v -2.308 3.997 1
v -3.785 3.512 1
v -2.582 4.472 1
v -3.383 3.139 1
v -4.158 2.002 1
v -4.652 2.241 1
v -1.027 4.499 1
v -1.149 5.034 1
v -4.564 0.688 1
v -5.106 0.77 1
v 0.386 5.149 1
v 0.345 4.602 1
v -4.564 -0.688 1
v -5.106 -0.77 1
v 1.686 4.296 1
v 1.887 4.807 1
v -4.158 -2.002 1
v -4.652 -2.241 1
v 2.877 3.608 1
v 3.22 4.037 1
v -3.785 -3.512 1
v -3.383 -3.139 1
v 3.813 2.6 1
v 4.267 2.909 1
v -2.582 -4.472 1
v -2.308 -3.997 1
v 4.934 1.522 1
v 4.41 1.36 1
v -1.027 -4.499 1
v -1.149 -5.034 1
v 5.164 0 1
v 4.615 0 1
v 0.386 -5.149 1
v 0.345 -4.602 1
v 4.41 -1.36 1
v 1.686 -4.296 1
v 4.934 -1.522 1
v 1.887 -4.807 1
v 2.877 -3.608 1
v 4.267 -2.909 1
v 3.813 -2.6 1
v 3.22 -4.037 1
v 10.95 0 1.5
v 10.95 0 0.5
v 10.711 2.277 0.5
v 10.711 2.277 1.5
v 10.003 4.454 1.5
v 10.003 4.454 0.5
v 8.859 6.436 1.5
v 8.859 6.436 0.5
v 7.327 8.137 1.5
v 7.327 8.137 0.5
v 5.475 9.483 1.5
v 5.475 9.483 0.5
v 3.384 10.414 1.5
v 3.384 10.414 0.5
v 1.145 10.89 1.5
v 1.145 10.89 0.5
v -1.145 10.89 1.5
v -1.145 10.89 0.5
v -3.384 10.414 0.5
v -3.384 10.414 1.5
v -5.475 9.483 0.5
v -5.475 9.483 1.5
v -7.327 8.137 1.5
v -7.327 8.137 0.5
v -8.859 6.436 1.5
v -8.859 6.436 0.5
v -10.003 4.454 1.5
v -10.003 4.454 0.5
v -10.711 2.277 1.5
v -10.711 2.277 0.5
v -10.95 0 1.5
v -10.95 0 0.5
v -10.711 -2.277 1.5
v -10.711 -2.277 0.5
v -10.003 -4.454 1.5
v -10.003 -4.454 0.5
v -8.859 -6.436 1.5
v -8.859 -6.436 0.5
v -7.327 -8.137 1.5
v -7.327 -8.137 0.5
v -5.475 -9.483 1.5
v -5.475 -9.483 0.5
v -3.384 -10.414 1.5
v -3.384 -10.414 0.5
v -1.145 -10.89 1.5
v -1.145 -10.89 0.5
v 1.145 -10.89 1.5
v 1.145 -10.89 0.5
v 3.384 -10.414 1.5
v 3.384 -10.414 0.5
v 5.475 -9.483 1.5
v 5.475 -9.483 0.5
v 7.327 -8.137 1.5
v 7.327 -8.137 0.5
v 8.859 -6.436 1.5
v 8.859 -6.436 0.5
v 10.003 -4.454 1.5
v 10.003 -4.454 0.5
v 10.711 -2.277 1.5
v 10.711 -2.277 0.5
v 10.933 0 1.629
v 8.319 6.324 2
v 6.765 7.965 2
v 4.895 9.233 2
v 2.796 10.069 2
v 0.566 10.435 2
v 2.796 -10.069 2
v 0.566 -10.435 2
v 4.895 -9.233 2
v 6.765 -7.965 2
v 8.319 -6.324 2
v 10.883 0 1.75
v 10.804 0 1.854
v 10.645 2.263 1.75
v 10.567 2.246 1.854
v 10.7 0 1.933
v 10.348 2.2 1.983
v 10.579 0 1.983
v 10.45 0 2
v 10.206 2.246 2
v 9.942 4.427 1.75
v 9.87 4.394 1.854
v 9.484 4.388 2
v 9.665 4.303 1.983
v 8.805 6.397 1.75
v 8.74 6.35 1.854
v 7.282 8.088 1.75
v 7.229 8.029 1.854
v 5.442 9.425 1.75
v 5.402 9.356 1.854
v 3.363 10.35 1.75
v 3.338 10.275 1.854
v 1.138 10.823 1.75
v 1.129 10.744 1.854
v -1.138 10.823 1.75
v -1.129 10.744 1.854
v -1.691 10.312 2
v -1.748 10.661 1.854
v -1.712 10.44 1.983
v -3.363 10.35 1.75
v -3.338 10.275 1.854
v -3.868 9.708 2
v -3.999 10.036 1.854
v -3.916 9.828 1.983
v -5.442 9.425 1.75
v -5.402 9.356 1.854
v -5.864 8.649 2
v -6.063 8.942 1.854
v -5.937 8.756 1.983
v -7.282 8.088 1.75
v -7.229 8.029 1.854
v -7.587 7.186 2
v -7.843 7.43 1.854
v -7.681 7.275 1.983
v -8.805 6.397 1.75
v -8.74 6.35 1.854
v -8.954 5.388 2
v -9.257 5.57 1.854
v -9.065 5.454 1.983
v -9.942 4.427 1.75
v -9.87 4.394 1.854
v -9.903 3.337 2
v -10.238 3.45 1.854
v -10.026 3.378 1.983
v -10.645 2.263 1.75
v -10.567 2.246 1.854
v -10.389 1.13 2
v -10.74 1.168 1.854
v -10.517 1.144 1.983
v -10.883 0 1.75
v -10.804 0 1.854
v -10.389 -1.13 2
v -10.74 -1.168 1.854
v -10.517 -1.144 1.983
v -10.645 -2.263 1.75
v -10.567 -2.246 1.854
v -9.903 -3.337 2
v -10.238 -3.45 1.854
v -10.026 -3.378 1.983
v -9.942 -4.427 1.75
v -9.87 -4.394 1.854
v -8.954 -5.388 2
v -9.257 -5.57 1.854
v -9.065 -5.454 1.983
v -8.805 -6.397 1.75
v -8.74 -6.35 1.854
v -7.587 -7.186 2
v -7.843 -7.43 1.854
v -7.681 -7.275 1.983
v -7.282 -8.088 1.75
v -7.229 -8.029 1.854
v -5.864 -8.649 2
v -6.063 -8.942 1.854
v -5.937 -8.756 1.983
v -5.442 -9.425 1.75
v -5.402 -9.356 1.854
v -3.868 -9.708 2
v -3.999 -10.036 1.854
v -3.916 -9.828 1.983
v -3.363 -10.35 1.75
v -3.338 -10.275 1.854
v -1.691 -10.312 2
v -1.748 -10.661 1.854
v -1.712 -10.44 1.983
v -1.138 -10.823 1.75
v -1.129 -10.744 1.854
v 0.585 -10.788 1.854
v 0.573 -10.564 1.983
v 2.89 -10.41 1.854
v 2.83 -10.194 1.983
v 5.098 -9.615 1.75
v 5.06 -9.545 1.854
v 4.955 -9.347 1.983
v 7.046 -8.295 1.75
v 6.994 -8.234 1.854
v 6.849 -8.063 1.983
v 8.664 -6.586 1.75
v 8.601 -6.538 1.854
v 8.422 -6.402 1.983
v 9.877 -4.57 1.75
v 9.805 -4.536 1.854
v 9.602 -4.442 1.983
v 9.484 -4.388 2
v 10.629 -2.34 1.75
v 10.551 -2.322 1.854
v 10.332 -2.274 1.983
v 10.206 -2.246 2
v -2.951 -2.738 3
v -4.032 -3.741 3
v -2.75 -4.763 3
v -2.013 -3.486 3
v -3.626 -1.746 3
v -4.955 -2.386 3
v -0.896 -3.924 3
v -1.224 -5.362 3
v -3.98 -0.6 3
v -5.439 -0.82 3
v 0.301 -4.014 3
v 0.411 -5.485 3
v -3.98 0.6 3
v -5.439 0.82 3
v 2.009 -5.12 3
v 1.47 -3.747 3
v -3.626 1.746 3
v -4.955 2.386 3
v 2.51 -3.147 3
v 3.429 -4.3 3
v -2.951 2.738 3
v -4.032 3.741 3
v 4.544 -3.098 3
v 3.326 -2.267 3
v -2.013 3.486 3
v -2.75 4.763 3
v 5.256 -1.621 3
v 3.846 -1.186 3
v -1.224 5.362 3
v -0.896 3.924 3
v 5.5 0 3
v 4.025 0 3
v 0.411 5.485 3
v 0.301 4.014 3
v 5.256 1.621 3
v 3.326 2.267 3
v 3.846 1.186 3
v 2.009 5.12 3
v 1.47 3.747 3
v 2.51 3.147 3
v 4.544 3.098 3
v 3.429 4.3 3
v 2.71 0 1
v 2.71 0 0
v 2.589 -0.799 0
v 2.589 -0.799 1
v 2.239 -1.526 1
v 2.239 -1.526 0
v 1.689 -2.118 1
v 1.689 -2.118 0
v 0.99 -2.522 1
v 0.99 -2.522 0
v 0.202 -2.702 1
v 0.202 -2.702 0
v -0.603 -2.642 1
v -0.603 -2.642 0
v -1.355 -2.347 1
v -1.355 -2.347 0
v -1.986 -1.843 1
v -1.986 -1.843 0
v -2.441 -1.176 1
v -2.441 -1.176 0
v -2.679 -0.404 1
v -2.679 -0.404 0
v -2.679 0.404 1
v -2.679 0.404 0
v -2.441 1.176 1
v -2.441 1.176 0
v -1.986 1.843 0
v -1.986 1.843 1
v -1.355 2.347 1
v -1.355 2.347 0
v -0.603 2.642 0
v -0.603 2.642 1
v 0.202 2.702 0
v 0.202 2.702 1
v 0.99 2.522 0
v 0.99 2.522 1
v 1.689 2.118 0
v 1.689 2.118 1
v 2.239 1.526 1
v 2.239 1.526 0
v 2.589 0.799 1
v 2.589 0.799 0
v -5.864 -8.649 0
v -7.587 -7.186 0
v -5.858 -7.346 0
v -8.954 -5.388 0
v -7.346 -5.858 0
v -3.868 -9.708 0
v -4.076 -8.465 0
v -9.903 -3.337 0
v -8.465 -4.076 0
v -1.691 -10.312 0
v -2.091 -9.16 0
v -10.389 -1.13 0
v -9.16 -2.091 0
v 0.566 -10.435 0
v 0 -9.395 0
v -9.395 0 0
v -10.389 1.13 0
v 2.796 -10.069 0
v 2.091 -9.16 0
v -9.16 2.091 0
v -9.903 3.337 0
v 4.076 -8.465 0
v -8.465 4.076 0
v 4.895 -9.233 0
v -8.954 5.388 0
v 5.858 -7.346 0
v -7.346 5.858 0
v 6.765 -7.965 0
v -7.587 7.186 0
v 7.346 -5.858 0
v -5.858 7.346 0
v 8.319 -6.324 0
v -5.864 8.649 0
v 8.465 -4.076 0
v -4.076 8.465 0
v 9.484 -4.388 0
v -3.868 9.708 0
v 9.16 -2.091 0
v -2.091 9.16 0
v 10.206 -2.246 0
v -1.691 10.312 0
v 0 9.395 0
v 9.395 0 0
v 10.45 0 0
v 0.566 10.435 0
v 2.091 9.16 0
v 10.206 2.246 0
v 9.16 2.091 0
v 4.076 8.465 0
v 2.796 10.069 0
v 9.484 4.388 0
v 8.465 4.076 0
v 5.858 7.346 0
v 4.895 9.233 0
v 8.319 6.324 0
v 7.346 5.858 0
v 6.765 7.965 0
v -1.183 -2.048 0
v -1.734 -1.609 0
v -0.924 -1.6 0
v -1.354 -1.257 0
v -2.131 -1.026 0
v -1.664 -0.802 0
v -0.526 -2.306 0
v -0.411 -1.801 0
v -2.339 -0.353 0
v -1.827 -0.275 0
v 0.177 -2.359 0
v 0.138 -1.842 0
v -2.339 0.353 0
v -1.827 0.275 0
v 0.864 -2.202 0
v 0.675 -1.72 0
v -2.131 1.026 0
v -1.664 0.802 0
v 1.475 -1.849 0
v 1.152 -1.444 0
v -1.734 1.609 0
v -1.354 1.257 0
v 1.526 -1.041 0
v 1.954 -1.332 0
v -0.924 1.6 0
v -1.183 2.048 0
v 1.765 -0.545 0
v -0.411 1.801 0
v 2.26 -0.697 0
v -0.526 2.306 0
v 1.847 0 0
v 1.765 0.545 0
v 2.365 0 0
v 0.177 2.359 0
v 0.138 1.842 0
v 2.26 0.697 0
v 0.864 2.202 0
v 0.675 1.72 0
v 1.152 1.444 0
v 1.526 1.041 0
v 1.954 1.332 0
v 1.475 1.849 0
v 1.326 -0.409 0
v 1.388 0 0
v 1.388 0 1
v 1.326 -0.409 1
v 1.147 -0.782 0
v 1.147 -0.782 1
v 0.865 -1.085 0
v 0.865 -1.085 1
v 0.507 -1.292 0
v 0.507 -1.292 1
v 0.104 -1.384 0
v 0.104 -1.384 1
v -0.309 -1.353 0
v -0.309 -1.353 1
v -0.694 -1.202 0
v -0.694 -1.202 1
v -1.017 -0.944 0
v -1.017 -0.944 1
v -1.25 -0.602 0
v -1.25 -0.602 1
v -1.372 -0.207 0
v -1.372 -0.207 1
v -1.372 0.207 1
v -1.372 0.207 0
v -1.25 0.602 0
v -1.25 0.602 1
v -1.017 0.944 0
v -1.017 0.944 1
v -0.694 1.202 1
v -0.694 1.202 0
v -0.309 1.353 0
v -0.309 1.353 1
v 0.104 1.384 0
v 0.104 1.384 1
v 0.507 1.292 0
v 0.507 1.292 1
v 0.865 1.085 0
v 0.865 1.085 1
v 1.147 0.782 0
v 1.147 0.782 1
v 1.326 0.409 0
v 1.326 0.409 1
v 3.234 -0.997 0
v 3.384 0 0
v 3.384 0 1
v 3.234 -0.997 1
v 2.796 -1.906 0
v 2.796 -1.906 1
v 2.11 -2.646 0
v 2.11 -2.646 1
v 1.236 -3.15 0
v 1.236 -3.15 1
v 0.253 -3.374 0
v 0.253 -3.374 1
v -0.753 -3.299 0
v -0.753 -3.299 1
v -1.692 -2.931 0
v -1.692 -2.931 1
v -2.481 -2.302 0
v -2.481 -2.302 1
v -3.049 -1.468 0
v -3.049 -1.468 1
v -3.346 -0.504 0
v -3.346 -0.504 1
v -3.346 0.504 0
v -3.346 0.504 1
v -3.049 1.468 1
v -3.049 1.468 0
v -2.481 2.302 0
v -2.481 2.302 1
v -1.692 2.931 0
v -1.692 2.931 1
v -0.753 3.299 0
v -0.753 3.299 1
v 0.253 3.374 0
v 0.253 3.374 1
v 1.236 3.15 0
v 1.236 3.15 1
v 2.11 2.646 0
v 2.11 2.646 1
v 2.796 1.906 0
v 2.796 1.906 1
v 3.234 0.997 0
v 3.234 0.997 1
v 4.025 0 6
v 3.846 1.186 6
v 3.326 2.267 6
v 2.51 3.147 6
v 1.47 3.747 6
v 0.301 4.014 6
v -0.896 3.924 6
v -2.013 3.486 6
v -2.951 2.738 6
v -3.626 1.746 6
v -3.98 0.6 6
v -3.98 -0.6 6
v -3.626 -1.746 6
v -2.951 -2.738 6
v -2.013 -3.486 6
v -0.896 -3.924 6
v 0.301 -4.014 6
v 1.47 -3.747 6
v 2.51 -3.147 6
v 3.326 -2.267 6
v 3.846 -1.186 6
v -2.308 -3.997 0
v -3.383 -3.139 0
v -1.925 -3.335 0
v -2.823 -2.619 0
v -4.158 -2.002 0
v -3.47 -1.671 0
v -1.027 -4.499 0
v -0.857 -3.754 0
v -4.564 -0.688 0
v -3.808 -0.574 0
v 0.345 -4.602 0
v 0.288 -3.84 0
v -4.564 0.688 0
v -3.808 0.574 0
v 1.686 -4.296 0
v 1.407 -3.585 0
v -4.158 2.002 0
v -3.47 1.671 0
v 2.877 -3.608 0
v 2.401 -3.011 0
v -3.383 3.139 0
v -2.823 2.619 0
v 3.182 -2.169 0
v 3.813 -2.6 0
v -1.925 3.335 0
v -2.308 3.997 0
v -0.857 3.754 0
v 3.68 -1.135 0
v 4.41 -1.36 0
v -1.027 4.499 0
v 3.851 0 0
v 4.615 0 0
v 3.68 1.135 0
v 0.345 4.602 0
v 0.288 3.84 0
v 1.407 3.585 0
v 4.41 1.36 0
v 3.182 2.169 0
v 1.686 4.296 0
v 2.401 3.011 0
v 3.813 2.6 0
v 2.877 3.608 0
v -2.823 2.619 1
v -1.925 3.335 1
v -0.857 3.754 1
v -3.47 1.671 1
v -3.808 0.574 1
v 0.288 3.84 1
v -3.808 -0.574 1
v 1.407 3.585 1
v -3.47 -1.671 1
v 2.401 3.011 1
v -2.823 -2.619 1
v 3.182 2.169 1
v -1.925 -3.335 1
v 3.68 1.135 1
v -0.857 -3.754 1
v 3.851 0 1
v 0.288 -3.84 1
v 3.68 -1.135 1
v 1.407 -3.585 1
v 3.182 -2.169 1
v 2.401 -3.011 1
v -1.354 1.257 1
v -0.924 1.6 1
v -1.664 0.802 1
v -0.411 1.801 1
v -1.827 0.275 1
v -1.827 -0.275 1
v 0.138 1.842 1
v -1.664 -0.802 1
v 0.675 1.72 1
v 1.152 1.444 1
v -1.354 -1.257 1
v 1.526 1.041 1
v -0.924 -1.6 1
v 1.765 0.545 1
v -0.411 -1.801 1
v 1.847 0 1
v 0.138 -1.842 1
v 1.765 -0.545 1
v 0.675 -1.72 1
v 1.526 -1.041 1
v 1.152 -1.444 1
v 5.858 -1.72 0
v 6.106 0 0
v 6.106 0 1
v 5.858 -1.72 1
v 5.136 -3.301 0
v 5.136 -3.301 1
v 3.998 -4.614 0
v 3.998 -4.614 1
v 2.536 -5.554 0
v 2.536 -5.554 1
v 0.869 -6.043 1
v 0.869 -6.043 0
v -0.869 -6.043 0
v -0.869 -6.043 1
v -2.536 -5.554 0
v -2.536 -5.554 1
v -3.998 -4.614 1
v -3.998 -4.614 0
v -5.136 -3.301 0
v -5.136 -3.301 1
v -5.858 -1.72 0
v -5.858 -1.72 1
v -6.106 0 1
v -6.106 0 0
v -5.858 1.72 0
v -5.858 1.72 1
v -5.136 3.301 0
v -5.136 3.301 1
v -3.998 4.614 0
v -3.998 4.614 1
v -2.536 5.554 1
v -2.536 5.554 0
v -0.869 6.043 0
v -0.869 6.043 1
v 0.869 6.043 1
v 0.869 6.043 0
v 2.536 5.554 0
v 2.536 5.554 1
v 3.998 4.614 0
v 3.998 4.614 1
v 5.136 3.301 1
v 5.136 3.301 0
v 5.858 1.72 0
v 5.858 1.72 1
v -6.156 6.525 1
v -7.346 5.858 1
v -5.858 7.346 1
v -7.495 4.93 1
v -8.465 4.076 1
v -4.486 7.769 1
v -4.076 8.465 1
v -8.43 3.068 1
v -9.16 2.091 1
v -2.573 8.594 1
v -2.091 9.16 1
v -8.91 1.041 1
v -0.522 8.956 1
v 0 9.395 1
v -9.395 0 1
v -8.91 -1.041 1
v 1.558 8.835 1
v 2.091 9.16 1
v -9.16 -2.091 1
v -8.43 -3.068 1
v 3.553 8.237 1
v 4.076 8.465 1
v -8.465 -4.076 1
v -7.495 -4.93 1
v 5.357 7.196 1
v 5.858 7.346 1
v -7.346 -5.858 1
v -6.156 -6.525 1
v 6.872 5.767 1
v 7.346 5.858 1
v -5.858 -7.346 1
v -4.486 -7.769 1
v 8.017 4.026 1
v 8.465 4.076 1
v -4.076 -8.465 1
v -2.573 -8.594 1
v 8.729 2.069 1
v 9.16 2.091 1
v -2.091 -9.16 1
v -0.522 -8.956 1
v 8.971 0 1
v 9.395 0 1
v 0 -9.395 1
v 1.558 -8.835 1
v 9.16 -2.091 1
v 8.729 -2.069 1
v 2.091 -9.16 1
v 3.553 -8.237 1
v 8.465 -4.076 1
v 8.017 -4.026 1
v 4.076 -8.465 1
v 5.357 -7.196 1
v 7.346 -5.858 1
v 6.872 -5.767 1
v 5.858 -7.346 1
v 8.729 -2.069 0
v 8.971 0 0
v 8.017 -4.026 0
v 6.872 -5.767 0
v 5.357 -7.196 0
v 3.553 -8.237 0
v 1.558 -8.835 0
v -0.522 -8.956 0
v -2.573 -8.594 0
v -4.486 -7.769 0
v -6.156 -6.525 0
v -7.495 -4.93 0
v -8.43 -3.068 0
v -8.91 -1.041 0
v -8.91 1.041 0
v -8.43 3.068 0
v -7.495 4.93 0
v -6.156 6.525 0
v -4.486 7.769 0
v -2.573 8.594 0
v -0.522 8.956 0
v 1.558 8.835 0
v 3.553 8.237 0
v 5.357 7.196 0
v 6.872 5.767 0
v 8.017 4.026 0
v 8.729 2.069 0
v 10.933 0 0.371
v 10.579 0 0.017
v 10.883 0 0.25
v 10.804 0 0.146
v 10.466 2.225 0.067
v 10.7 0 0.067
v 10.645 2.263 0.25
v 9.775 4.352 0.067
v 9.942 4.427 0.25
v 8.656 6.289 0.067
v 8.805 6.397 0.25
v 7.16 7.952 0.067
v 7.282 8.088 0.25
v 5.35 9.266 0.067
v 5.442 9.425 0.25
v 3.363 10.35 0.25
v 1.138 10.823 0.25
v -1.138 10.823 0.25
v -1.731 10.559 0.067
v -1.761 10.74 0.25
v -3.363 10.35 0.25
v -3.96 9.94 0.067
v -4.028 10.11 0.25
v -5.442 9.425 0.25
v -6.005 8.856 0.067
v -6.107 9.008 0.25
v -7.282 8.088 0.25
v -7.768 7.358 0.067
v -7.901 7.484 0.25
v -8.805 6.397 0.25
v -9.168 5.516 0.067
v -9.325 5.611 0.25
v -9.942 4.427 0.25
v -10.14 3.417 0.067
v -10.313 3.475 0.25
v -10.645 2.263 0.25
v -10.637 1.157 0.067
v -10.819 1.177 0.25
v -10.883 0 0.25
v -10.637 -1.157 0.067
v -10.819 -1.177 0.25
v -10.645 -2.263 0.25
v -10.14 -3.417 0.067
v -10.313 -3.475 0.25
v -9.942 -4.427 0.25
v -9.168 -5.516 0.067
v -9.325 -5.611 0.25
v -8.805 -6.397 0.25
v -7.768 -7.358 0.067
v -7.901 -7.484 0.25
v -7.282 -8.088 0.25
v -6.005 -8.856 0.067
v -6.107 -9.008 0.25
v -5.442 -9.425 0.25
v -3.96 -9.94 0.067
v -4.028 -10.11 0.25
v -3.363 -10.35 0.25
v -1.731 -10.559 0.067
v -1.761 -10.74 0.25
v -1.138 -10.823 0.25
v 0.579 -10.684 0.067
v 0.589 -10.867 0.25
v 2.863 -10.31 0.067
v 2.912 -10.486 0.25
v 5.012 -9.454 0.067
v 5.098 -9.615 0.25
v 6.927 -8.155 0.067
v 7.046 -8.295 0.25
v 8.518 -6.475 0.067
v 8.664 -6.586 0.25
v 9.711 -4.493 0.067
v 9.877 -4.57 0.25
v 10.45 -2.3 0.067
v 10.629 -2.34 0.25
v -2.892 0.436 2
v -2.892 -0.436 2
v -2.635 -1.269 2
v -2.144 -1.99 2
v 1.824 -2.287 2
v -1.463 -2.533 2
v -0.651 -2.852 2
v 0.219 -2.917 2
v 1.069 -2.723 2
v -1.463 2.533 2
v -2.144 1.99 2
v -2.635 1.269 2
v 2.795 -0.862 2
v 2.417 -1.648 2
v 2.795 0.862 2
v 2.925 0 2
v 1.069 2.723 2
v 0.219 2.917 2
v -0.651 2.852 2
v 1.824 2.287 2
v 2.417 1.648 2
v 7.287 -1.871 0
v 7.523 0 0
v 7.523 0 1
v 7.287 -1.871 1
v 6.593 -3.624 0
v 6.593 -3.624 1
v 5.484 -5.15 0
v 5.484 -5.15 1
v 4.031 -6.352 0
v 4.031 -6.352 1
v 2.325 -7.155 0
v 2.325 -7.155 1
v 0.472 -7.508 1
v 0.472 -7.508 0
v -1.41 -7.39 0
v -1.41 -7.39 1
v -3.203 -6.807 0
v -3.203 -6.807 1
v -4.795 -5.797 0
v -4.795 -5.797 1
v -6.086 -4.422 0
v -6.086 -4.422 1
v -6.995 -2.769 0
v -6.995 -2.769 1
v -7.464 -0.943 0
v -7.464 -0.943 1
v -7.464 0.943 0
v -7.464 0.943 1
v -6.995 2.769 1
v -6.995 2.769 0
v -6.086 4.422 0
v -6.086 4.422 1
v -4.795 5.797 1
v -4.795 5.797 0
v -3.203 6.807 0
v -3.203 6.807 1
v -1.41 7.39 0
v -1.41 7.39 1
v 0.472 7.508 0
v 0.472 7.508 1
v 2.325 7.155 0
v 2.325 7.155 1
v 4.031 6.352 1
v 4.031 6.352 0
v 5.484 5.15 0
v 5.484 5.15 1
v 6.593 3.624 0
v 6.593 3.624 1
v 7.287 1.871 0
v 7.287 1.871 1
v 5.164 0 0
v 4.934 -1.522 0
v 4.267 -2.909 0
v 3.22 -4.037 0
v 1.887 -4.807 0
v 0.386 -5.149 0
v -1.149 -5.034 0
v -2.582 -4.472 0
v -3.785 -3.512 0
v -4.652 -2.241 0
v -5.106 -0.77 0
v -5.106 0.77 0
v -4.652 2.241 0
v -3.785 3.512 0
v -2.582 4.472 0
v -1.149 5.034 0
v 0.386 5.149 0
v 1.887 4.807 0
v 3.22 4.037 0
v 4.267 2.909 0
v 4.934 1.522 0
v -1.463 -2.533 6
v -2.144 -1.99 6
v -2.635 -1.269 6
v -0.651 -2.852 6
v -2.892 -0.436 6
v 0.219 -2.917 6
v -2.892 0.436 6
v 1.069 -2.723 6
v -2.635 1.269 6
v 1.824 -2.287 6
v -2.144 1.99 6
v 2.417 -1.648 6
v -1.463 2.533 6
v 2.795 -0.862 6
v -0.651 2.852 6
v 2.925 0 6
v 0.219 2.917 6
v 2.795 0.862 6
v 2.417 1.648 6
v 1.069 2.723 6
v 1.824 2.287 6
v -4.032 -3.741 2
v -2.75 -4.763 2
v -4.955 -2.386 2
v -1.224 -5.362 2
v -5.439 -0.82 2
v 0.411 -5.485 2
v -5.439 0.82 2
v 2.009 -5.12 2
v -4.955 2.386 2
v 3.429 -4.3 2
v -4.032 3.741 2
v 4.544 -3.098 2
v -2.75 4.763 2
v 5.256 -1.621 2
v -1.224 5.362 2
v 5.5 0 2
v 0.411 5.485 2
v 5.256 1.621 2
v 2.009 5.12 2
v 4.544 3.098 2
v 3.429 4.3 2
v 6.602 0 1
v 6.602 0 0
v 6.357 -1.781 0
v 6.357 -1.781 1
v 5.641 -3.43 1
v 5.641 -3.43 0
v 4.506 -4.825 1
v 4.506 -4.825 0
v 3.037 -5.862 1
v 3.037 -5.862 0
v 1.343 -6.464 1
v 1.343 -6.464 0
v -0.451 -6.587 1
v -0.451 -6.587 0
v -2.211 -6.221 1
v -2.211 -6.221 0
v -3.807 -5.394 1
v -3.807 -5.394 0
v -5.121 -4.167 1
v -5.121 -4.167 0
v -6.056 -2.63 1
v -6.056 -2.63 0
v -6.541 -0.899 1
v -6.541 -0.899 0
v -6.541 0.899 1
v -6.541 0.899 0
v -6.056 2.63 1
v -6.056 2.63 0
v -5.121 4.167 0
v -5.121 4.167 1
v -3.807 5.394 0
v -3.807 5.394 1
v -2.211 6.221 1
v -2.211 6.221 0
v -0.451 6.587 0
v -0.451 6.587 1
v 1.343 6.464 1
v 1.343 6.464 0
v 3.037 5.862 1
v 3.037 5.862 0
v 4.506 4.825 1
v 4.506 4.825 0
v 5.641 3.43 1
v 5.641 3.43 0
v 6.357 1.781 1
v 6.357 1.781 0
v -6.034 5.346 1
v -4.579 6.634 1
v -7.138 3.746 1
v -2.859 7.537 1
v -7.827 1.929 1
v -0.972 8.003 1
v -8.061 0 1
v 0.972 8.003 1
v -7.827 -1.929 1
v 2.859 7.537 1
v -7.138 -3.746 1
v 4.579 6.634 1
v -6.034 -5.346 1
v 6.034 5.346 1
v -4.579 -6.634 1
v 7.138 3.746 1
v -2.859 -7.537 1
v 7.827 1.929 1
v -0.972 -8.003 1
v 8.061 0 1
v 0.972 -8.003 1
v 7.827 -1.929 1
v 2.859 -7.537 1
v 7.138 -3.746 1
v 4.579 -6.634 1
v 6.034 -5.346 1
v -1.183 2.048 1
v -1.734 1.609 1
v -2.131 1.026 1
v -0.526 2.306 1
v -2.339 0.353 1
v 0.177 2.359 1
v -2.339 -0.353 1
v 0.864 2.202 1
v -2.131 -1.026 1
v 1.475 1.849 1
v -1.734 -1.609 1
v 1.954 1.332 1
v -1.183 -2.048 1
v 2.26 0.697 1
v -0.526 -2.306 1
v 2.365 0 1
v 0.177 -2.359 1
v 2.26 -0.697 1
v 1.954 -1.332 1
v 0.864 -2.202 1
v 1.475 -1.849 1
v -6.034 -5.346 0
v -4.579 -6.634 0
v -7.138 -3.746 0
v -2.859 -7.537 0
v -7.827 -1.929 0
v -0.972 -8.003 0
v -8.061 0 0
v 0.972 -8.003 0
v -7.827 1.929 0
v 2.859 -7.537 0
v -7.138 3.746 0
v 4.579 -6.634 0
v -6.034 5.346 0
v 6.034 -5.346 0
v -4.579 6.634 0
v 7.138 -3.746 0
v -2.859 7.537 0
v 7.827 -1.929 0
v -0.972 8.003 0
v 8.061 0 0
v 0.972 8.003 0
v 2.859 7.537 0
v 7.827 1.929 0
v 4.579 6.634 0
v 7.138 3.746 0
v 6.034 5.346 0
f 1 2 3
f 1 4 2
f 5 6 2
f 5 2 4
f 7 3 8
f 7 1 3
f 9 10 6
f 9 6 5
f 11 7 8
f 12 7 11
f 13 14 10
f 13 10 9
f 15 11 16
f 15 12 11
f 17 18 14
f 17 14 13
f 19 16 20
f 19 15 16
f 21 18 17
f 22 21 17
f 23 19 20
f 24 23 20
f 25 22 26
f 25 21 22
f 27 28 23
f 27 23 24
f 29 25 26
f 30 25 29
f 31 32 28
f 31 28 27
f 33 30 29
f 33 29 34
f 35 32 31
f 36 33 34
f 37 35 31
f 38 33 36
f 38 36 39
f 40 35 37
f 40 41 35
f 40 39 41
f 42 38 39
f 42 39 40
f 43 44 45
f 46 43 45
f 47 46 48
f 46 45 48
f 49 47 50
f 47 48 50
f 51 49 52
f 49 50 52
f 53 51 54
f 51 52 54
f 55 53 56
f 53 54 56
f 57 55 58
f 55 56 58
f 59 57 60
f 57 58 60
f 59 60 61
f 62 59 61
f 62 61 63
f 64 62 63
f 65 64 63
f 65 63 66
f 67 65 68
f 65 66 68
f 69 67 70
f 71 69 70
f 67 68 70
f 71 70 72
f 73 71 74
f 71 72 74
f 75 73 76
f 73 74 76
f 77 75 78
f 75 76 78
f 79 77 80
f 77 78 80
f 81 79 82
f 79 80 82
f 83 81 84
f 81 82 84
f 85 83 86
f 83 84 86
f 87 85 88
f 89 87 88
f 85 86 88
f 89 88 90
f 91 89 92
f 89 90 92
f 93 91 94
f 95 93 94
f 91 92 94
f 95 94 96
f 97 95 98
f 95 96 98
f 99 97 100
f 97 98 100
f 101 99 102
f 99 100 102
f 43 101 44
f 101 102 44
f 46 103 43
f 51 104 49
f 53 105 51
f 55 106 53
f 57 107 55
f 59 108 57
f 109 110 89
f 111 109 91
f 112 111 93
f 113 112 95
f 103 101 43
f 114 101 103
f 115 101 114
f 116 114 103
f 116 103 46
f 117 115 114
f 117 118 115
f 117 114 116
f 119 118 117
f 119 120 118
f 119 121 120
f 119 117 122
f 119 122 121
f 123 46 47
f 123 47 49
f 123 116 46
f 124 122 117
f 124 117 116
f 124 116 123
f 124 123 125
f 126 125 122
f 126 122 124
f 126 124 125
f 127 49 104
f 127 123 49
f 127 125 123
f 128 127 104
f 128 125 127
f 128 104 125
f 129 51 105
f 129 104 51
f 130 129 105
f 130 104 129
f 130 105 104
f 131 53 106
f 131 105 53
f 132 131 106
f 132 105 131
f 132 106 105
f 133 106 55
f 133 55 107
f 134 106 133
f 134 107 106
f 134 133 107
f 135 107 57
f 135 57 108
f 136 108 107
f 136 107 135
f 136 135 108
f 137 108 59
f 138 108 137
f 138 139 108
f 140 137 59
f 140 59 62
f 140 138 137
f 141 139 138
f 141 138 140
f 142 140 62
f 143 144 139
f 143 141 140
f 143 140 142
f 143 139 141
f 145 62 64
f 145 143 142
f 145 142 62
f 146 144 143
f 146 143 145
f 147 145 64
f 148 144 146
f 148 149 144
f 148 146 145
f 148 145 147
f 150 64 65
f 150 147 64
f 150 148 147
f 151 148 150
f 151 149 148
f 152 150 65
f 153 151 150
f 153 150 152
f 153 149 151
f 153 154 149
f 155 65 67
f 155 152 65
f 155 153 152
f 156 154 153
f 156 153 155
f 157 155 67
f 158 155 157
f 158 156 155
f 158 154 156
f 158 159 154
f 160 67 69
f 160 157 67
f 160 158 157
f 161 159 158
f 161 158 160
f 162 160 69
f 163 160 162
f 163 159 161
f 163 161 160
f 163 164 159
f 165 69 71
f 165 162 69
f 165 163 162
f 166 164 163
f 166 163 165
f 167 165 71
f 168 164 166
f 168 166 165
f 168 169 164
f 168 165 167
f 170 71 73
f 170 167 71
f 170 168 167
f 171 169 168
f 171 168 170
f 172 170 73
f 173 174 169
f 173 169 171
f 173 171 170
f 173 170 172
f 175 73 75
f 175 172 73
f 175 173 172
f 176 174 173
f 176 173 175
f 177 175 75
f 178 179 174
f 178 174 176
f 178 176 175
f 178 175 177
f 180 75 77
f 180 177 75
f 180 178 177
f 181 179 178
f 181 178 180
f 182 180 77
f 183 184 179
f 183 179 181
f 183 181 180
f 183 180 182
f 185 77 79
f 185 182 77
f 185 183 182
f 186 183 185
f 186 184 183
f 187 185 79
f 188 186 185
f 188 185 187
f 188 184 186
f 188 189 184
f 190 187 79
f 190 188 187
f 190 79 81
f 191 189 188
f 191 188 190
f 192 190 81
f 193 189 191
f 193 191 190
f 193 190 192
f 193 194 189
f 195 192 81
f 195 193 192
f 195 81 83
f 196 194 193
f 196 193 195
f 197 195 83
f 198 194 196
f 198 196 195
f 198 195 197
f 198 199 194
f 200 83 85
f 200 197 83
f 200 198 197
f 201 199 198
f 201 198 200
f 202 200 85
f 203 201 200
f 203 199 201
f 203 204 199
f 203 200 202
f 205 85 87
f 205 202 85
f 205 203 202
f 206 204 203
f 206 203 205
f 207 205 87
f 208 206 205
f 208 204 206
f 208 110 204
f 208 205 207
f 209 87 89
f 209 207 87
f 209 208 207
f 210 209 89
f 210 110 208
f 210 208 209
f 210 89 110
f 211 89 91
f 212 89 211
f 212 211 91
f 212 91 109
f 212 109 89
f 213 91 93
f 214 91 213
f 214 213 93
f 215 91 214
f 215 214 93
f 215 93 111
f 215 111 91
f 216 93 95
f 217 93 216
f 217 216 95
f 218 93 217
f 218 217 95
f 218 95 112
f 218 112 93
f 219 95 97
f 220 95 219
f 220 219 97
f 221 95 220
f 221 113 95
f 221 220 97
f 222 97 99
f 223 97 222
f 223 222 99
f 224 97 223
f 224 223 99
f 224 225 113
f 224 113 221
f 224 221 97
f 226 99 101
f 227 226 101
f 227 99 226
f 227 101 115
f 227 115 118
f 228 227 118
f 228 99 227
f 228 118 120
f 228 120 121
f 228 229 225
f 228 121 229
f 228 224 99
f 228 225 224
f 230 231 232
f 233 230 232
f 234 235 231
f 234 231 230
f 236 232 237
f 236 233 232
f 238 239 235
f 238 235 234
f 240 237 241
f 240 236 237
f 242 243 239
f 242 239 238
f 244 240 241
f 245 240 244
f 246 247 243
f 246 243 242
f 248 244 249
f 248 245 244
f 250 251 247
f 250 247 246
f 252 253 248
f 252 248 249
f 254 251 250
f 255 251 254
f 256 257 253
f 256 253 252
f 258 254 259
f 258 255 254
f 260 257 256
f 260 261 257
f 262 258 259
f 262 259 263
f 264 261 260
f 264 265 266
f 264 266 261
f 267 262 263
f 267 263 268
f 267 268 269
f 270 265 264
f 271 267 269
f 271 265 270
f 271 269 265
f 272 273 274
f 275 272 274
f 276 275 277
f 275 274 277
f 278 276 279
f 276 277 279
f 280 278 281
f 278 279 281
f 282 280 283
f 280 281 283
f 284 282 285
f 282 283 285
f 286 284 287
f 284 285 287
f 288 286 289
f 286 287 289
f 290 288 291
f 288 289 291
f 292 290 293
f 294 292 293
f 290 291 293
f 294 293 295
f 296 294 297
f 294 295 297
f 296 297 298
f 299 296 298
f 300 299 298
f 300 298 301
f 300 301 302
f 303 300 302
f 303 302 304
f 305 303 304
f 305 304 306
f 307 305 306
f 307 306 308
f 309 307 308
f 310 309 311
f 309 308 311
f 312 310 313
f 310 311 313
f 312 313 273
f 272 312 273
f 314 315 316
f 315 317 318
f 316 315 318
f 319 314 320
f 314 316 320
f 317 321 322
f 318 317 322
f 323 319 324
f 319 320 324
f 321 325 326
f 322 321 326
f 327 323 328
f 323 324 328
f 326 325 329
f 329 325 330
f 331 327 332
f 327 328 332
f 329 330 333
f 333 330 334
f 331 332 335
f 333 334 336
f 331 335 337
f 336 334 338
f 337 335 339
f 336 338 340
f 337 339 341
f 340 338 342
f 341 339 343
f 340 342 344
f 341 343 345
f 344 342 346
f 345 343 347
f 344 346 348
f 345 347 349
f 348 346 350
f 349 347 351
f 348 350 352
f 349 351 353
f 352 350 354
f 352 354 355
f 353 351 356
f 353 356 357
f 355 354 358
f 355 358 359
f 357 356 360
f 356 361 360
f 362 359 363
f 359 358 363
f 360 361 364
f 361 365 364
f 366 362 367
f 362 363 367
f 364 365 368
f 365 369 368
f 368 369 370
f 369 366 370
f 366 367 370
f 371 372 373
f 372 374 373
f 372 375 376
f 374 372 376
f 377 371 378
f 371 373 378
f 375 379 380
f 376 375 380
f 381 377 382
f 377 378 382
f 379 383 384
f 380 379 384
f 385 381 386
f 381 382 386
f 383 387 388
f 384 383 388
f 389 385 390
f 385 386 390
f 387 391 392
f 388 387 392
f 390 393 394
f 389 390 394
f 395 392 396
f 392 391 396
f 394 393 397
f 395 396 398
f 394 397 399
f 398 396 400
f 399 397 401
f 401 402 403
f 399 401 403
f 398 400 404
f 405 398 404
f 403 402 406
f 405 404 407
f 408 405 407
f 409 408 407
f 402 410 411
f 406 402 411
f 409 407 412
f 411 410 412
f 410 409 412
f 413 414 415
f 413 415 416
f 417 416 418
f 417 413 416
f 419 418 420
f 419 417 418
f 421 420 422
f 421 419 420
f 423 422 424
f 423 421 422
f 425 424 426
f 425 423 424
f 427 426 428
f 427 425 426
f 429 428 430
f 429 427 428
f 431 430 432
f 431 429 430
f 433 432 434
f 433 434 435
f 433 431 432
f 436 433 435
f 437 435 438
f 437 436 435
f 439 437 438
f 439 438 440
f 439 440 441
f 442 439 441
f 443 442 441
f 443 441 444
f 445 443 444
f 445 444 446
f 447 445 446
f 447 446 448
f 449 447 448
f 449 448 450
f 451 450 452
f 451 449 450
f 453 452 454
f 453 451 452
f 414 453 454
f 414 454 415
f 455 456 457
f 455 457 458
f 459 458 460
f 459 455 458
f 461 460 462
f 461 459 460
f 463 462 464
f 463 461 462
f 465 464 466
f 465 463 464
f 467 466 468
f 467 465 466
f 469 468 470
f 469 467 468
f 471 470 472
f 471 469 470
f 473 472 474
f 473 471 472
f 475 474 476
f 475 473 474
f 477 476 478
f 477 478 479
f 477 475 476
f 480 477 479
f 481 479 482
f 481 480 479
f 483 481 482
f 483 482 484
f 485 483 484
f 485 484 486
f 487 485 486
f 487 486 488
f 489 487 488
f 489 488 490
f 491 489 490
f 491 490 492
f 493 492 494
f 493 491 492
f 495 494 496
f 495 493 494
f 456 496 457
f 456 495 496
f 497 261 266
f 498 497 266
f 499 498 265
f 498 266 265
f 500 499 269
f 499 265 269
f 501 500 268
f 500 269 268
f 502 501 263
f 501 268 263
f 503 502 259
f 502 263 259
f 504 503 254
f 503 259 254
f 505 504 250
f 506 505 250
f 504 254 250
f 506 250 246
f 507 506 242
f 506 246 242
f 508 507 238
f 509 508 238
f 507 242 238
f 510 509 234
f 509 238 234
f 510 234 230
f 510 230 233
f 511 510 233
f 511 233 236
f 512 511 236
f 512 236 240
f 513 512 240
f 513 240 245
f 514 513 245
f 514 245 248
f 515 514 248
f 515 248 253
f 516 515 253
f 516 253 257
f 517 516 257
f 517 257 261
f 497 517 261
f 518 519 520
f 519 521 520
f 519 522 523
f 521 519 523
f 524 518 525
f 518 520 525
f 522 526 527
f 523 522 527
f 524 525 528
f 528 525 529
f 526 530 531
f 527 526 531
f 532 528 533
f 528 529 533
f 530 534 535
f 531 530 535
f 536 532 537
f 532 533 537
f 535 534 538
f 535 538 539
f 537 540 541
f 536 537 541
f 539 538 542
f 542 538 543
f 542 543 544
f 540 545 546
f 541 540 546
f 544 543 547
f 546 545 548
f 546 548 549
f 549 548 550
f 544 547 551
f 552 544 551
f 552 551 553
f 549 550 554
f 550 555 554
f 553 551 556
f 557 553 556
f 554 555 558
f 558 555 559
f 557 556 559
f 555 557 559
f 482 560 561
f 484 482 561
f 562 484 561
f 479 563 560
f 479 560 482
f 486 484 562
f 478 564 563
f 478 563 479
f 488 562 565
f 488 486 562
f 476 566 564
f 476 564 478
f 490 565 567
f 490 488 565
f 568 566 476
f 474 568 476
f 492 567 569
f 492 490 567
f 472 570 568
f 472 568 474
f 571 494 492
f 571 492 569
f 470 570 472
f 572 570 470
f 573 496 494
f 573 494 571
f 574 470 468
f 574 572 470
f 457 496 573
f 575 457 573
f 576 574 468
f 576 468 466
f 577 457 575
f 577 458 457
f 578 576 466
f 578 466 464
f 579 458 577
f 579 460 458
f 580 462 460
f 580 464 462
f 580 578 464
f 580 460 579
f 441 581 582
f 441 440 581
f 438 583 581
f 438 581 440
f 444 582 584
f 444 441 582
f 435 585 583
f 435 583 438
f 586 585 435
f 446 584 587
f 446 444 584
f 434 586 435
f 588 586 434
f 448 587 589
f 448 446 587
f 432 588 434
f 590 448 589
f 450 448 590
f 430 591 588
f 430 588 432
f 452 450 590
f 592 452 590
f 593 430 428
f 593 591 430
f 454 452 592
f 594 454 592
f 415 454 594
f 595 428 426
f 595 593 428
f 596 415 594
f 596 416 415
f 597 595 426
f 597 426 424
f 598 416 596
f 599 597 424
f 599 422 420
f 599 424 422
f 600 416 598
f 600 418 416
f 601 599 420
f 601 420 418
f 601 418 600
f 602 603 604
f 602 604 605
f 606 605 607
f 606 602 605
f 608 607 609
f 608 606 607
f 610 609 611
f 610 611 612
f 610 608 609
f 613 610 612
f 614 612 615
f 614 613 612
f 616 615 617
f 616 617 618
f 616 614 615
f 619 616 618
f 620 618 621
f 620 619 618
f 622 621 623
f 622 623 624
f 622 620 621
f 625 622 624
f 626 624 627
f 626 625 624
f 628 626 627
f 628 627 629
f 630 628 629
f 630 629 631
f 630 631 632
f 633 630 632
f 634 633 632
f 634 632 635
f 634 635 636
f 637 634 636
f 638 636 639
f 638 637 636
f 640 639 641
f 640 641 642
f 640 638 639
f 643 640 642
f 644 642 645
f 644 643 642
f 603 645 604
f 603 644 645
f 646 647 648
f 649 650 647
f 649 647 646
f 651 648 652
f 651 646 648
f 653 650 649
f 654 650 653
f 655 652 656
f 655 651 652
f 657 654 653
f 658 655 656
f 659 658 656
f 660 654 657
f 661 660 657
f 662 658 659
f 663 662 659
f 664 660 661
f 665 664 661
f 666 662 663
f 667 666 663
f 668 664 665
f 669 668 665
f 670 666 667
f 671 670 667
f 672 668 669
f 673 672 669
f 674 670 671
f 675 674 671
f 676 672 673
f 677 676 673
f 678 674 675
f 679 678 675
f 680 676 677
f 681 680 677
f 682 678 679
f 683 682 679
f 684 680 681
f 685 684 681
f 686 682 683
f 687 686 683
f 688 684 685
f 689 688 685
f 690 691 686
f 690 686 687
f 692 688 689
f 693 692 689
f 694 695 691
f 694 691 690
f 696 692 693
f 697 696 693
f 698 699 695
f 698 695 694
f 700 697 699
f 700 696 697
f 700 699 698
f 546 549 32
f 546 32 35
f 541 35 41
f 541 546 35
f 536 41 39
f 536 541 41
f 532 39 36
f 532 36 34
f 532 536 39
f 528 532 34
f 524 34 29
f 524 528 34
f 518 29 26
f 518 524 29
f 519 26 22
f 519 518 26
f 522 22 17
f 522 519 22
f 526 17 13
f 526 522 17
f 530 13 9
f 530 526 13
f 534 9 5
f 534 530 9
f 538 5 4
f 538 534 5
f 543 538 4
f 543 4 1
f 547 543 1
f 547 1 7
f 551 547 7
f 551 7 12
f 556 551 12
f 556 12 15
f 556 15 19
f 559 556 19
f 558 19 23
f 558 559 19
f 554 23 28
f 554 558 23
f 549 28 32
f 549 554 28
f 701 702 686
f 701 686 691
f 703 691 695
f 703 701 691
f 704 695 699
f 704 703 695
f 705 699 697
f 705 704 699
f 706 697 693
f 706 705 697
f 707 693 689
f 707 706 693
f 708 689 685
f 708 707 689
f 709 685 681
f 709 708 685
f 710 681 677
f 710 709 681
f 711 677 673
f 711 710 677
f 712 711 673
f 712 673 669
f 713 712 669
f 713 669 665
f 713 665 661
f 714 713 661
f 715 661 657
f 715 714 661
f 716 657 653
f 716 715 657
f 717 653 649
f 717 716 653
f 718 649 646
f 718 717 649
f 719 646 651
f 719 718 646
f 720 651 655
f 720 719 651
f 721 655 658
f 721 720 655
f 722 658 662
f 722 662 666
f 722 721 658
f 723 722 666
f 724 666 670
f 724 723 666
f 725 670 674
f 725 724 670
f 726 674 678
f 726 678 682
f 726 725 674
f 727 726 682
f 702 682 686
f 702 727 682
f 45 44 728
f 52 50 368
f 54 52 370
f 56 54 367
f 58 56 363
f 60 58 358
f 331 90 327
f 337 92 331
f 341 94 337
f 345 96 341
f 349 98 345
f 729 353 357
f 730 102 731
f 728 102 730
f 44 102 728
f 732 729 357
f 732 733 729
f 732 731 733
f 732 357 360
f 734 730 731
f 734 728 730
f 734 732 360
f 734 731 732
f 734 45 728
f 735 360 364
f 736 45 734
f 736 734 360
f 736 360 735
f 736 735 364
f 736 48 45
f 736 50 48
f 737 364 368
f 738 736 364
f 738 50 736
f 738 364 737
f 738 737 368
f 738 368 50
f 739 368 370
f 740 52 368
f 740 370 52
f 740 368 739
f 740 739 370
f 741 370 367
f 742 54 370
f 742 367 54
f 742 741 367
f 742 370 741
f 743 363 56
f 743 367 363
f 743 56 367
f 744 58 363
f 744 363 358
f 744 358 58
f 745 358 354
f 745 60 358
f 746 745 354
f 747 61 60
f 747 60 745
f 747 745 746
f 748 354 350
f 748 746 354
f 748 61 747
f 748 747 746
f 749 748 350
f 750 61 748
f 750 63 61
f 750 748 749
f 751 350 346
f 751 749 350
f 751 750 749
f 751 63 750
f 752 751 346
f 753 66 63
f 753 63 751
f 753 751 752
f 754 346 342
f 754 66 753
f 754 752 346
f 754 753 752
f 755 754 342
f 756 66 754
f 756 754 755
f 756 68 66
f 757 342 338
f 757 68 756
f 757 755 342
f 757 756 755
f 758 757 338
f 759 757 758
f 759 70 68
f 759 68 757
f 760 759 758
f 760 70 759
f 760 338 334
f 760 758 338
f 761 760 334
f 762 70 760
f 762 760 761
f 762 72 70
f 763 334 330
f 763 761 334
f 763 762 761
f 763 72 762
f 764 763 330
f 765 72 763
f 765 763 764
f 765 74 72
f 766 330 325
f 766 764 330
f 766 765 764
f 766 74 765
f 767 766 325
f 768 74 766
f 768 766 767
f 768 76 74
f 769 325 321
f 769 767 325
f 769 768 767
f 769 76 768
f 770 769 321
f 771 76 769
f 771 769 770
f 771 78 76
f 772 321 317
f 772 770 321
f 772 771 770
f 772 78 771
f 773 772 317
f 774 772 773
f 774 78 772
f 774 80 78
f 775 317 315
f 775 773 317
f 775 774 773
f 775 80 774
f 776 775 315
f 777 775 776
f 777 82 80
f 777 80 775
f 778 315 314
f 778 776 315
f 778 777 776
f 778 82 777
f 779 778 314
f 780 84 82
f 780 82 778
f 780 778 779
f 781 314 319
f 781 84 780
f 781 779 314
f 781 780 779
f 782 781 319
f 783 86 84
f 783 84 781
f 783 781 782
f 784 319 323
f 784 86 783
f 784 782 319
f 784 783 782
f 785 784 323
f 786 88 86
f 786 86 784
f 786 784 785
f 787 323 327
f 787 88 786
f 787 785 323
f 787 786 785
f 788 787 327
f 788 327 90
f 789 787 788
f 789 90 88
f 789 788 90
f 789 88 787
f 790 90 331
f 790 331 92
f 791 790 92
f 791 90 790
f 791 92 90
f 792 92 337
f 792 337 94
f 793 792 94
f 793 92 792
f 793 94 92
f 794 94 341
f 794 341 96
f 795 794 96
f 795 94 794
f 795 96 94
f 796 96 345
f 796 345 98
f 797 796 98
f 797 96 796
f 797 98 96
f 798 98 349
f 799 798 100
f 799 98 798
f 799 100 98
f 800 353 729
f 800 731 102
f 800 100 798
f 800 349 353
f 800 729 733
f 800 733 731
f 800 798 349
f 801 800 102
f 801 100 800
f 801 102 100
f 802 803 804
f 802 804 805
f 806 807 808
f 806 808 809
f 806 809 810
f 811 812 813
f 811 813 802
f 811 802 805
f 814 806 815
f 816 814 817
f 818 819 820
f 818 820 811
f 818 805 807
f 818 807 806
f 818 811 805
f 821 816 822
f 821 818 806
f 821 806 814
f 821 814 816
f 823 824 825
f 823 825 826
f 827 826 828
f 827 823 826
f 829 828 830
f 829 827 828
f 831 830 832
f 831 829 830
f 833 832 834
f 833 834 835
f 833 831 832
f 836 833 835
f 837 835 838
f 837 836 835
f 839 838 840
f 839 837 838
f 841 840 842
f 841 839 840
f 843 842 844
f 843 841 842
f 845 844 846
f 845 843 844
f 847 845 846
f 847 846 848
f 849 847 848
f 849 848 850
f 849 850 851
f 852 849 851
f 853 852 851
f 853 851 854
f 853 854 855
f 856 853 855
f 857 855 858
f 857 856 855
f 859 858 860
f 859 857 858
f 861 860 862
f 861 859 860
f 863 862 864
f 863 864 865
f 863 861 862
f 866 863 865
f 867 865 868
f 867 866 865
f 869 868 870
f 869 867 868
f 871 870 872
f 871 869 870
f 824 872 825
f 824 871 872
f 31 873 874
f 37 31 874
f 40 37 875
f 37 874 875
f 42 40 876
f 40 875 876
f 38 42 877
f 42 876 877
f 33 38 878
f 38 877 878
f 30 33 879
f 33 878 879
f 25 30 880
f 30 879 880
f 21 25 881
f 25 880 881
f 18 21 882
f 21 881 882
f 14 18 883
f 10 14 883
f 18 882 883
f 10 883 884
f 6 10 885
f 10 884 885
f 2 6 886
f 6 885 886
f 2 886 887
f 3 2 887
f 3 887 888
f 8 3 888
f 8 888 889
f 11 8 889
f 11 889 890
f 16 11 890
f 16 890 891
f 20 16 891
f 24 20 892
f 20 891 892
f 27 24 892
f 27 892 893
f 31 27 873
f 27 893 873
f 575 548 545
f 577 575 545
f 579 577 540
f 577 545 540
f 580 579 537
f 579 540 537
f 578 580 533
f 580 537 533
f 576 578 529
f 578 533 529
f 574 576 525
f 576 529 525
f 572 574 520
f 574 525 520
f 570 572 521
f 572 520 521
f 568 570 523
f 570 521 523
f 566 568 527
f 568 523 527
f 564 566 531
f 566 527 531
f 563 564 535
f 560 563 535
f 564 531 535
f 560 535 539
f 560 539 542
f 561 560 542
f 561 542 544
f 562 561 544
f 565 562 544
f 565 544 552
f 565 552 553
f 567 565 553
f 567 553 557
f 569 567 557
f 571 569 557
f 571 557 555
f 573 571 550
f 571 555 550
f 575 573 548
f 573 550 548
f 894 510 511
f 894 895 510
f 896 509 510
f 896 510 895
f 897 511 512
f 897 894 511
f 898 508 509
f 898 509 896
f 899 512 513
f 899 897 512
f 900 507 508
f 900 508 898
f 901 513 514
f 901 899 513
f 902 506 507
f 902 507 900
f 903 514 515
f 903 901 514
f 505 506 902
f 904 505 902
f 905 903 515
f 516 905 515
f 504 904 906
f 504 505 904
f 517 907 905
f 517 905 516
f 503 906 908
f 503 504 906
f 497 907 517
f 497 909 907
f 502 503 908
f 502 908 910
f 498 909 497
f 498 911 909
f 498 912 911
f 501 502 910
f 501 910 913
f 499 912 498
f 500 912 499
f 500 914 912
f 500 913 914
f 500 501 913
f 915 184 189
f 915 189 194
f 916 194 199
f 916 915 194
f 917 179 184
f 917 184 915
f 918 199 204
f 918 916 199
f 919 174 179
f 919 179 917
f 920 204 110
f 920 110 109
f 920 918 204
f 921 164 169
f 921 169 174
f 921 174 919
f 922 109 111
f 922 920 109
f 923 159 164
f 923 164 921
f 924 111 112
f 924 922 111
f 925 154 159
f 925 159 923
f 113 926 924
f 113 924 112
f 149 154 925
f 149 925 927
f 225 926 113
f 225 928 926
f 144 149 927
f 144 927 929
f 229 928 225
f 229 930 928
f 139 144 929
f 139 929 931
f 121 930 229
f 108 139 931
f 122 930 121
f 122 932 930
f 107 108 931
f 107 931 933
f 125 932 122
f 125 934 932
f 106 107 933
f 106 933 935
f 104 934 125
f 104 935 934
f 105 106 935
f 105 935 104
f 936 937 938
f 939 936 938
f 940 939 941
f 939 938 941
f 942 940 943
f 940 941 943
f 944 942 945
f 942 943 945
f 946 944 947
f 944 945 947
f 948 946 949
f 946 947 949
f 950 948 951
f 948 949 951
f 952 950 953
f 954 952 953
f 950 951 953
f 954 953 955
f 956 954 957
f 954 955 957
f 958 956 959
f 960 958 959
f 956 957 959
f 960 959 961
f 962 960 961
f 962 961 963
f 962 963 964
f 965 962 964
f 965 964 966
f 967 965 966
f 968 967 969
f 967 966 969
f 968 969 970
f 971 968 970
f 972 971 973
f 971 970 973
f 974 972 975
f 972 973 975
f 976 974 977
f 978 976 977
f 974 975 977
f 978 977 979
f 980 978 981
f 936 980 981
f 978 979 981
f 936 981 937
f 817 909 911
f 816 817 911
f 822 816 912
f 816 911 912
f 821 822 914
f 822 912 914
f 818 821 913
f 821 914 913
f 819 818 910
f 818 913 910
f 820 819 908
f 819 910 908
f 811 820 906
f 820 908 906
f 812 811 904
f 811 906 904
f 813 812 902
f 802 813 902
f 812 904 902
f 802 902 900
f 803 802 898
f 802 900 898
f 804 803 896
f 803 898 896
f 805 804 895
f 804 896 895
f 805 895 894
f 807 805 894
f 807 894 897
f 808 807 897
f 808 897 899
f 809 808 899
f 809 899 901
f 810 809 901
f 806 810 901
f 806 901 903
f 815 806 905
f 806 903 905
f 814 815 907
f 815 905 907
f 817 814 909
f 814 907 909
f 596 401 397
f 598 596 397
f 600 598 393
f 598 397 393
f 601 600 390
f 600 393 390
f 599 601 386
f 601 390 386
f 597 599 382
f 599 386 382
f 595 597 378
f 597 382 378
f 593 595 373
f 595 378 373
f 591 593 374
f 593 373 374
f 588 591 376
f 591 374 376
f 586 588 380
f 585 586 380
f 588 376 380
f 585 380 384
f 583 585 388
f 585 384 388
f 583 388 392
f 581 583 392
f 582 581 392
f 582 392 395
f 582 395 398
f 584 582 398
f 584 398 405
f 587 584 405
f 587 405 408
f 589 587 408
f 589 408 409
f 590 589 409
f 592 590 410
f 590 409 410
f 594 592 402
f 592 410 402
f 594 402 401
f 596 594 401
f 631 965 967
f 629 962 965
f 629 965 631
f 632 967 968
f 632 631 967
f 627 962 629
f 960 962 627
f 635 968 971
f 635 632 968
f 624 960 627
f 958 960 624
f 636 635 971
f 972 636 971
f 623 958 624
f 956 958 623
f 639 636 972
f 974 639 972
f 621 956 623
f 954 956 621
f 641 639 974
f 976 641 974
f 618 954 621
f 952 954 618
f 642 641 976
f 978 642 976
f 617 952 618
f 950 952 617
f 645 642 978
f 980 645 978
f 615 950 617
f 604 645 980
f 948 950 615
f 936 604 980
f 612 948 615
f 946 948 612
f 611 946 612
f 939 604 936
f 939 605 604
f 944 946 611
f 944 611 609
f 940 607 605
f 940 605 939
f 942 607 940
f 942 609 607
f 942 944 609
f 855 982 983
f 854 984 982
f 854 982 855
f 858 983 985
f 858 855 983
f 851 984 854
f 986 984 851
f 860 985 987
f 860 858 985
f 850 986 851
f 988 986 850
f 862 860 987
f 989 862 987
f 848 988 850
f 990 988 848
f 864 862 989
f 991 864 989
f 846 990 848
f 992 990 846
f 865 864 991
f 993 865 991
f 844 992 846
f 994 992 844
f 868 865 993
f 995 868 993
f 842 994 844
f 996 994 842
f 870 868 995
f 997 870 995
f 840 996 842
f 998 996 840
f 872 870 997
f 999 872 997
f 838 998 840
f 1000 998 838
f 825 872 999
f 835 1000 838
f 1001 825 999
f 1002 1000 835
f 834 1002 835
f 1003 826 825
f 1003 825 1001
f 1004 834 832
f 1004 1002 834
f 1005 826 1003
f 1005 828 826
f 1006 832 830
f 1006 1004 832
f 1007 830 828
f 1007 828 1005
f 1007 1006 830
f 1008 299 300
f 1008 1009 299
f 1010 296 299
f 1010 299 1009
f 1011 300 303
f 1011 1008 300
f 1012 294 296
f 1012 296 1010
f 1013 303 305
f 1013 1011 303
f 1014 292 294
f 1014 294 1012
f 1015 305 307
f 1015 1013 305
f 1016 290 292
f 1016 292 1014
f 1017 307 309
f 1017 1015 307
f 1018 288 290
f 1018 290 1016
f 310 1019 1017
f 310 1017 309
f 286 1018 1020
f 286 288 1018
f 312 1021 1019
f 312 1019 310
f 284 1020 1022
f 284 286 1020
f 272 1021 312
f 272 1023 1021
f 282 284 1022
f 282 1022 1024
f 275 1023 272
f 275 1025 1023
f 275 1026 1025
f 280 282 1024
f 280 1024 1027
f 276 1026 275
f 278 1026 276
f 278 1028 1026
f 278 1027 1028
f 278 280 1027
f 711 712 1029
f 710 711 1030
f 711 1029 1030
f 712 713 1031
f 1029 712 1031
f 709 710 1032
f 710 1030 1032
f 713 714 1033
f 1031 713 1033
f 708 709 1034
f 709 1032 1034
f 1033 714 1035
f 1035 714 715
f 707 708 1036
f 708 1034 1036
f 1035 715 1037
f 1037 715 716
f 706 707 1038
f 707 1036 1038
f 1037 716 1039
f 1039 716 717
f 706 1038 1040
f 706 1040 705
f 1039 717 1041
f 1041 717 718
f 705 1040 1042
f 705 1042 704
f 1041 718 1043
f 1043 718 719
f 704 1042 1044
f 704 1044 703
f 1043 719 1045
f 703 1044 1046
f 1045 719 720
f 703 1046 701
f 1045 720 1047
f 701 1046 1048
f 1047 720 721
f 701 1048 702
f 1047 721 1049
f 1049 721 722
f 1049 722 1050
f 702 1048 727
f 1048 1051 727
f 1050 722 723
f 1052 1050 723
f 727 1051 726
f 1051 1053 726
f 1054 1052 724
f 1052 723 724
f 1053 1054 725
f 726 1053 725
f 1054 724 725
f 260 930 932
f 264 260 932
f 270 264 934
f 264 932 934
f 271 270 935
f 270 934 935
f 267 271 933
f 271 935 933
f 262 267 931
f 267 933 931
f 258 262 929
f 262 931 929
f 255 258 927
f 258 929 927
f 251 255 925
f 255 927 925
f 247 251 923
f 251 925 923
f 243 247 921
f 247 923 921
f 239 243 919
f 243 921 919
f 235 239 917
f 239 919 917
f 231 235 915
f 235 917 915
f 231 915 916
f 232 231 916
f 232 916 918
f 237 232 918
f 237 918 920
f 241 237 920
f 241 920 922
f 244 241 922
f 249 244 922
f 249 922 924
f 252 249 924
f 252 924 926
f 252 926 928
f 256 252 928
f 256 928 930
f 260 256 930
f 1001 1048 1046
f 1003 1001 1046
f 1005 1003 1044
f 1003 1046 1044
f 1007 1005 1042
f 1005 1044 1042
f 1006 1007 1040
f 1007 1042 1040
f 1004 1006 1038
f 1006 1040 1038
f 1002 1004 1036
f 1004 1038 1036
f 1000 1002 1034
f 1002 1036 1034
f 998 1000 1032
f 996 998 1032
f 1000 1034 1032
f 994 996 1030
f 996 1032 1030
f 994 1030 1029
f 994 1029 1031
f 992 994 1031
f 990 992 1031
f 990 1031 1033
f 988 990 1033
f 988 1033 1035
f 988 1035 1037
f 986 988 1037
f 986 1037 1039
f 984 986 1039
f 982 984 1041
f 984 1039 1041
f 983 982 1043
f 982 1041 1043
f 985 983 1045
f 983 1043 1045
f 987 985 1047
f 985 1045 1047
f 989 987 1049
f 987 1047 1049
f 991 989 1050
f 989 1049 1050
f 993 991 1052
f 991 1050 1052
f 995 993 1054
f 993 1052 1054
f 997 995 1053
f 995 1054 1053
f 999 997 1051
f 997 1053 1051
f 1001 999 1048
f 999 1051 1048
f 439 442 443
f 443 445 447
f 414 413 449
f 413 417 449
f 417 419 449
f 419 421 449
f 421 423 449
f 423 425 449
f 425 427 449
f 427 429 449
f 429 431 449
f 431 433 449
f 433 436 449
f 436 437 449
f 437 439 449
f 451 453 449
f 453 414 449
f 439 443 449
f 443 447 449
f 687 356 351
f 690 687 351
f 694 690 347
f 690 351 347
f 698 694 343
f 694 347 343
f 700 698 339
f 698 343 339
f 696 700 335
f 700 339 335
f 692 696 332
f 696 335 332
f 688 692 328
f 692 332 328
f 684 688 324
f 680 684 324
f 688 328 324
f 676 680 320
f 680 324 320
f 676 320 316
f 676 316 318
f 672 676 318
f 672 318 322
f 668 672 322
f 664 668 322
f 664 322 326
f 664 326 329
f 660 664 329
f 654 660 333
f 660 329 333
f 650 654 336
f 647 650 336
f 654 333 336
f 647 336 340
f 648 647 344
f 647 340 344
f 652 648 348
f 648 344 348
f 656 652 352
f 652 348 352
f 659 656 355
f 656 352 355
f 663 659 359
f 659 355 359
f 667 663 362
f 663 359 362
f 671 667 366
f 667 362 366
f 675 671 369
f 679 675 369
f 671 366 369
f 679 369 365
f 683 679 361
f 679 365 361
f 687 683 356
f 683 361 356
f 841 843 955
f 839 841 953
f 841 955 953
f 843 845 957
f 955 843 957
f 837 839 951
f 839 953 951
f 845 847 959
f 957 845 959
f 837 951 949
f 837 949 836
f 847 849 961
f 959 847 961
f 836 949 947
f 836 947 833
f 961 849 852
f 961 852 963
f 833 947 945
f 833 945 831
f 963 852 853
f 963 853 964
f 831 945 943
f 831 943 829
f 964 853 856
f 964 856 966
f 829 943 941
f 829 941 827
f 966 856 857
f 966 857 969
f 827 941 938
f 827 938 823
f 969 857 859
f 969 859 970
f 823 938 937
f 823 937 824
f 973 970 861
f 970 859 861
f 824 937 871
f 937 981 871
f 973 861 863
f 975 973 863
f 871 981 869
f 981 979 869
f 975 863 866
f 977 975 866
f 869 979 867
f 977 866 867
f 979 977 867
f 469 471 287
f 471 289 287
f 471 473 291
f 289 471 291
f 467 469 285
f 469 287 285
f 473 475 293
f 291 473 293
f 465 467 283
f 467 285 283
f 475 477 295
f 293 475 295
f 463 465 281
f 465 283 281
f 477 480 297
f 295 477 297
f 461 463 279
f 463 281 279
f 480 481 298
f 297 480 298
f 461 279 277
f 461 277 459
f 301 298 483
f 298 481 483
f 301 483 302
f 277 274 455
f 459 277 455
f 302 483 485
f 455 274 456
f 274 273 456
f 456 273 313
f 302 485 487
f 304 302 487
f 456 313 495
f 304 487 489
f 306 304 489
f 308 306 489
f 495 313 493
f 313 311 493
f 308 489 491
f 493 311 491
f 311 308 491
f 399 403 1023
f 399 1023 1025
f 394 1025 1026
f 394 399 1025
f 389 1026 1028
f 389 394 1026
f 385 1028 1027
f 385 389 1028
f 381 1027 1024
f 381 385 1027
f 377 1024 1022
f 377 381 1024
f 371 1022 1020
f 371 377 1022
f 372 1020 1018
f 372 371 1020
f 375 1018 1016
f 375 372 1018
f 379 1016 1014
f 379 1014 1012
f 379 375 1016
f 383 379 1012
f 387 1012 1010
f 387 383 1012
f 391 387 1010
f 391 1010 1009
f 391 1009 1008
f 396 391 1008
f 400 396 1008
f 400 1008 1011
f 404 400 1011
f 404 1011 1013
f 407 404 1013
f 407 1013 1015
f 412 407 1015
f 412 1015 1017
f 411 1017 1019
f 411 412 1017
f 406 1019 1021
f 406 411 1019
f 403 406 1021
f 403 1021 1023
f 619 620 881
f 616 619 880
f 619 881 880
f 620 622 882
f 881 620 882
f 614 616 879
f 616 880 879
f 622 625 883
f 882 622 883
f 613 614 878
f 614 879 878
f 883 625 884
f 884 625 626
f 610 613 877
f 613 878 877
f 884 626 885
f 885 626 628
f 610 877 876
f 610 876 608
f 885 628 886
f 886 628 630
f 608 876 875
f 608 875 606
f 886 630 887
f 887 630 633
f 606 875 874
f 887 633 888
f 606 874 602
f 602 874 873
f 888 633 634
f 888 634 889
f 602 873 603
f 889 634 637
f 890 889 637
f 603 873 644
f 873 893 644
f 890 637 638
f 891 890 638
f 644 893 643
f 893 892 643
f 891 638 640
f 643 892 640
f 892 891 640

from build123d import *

# Parameters (mm, degrees)
F0_R      = 10.95
F0_R_2    = 0.069
F3_DEPTH  = 2
F1_R      = 5.5
F4_DEPTH  = 3
F2_R      = 4.025
F5_DEPTH  = 6
F6_R      = 0.5
F7_R      = 2.925
F8_DEPTH  = 4
F9_R      = 9.395345
F9_R_2    = 8.971159
F9_R_3    = 8.061351
F9_R_4    = 7.523244
F9_R_5    = 6.602201
F9_R_6    = 6.105505
F9_R_7    = 5.163827
F9_R_8    = 4.615079
F9_R_9    = 3.850939
F9_R_10   = 3.383897
F9_R_11   = 2.709612
F9_R_12   = 2.365196
F9_R_13   = 1.847375
F9_R_14   = 1.387714
F10_DEPTH = 1


with BuildPart() as f3:
    # F0 (on Top) → F3 (new body)
    with BuildSketch(Plane.XY):
        Circle(F0_R)
        Circle(F0_R_2, mode=Mode.SUBTRACT)
    extrude(amount=F3_DEPTH)

    # F1 (on Top) → F4 (join)
    with BuildSketch(Plane.XY):
        Circle(F1_R)
    extrude(amount=F4_DEPTH)

    # F2 (on Top) → F5 (join)
    with BuildSketch(Plane.XY):
        Circle(F2_R)
    extrude(amount=F5_DEPTH)

    # F6
    f6_edges = [f3.edges().sort_by_distance(p)[0] for p in [
        (10.95, 0, 1),
        (-10.95, 0, 0),
        (-10.95, 0, 2),
    ]]
    fillet(f6_edges, radius=F6_R)

    # F7 (on face) → F8 (cut)
    with BuildSketch(Plane.XY.offset(6)):
        Circle(F7_R)
    extrude(amount=-F8_DEPTH, mode=Mode.SUBTRACT)

    # F9 (on face) → F10 (cut)
    with BuildSketch(Plane(origin=(0, 0, 0), x_dir=(1, 0, 0), z_dir=(0, 0, -1))):
        Circle(F9_R)
        Circle(F9_R_2, mode=Mode.SUBTRACT)
        Circle(F9_R_3)
        Circle(F9_R_4, mode=Mode.SUBTRACT)
        Circle(F9_R_5)
        Circle(F9_R_6, mode=Mode.SUBTRACT)
        Circle(F9_R_7)
        Circle(F9_R_8, mode=Mode.SUBTRACT)
        Circle(F9_R_9)
        Circle(F9_R_10, mode=Mode.SUBTRACT)
        Circle(F9_R_11)
        Circle(F9_R_12, mode=Mode.SUBTRACT)
        Circle(F9_R_13)
        Circle(F9_R_14, mode=Mode.SUBTRACT)
    extrude(amount=-F10_DEPTH, mode=Mode.SUBTRACT)


solid = f3.part
